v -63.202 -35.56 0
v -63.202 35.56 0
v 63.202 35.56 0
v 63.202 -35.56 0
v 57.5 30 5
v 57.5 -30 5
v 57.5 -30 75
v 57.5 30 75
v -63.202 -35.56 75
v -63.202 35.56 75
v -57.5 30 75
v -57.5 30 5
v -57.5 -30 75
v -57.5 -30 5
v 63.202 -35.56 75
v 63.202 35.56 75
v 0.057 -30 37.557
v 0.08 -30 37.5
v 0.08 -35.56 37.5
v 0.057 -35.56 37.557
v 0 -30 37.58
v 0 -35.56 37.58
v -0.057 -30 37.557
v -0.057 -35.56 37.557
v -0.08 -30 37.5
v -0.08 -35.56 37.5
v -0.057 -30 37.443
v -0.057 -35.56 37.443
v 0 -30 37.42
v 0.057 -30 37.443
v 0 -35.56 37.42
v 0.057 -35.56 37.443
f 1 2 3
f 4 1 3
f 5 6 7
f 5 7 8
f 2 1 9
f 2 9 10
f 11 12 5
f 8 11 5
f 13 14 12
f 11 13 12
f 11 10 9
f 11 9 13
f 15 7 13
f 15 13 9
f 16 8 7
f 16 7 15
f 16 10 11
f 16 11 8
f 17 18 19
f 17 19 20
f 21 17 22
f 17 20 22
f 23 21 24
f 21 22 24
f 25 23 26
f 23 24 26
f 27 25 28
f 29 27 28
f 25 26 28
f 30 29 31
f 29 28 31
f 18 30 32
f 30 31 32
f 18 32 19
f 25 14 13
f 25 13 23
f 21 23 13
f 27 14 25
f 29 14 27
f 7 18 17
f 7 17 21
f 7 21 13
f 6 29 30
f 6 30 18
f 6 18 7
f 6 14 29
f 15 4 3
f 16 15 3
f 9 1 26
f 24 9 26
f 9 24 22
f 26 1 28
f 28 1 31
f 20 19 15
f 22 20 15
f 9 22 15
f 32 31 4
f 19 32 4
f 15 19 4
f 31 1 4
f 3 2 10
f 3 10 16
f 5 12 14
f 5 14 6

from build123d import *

# Parameters (mm, degrees)
F0_W     = 115
F0_H     = 60
F2_DEPTH = 5
F1_W     = 126.404688
F1_H     = 71.120002
F1_W_2   = 115
F1_H_2   = 60
F3_DEPTH = 75
F4_R     = 0.08
F5_DEPTH = 7.5438


with BuildPart() as f2:
    # F0 (on Top) → F2 (new body)
    with BuildSketch(Plane.XY):
        Rectangle(F0_W, F0_H)
    extrude(amount=F2_DEPTH)

    # F1 (on face) → F3 (join)
    with BuildSketch(Plane.XY):
        Rectangle(F1_W, F1_H)
        Rectangle(F1_W_2, F1_H_2, mode=Mode.SUBTRACT)
    extrude(amount=F3_DEPTH)

    # F4 (on face) → F5 (cut)
    with BuildSketch(Plane.XZ.offset(35.560001)):
        with Locations((0, 37.5)):
            Circle(F4_R)
    extrude(amount=-F5_DEPTH, mode=Mode.SUBTRACT)


solid = f2.part
